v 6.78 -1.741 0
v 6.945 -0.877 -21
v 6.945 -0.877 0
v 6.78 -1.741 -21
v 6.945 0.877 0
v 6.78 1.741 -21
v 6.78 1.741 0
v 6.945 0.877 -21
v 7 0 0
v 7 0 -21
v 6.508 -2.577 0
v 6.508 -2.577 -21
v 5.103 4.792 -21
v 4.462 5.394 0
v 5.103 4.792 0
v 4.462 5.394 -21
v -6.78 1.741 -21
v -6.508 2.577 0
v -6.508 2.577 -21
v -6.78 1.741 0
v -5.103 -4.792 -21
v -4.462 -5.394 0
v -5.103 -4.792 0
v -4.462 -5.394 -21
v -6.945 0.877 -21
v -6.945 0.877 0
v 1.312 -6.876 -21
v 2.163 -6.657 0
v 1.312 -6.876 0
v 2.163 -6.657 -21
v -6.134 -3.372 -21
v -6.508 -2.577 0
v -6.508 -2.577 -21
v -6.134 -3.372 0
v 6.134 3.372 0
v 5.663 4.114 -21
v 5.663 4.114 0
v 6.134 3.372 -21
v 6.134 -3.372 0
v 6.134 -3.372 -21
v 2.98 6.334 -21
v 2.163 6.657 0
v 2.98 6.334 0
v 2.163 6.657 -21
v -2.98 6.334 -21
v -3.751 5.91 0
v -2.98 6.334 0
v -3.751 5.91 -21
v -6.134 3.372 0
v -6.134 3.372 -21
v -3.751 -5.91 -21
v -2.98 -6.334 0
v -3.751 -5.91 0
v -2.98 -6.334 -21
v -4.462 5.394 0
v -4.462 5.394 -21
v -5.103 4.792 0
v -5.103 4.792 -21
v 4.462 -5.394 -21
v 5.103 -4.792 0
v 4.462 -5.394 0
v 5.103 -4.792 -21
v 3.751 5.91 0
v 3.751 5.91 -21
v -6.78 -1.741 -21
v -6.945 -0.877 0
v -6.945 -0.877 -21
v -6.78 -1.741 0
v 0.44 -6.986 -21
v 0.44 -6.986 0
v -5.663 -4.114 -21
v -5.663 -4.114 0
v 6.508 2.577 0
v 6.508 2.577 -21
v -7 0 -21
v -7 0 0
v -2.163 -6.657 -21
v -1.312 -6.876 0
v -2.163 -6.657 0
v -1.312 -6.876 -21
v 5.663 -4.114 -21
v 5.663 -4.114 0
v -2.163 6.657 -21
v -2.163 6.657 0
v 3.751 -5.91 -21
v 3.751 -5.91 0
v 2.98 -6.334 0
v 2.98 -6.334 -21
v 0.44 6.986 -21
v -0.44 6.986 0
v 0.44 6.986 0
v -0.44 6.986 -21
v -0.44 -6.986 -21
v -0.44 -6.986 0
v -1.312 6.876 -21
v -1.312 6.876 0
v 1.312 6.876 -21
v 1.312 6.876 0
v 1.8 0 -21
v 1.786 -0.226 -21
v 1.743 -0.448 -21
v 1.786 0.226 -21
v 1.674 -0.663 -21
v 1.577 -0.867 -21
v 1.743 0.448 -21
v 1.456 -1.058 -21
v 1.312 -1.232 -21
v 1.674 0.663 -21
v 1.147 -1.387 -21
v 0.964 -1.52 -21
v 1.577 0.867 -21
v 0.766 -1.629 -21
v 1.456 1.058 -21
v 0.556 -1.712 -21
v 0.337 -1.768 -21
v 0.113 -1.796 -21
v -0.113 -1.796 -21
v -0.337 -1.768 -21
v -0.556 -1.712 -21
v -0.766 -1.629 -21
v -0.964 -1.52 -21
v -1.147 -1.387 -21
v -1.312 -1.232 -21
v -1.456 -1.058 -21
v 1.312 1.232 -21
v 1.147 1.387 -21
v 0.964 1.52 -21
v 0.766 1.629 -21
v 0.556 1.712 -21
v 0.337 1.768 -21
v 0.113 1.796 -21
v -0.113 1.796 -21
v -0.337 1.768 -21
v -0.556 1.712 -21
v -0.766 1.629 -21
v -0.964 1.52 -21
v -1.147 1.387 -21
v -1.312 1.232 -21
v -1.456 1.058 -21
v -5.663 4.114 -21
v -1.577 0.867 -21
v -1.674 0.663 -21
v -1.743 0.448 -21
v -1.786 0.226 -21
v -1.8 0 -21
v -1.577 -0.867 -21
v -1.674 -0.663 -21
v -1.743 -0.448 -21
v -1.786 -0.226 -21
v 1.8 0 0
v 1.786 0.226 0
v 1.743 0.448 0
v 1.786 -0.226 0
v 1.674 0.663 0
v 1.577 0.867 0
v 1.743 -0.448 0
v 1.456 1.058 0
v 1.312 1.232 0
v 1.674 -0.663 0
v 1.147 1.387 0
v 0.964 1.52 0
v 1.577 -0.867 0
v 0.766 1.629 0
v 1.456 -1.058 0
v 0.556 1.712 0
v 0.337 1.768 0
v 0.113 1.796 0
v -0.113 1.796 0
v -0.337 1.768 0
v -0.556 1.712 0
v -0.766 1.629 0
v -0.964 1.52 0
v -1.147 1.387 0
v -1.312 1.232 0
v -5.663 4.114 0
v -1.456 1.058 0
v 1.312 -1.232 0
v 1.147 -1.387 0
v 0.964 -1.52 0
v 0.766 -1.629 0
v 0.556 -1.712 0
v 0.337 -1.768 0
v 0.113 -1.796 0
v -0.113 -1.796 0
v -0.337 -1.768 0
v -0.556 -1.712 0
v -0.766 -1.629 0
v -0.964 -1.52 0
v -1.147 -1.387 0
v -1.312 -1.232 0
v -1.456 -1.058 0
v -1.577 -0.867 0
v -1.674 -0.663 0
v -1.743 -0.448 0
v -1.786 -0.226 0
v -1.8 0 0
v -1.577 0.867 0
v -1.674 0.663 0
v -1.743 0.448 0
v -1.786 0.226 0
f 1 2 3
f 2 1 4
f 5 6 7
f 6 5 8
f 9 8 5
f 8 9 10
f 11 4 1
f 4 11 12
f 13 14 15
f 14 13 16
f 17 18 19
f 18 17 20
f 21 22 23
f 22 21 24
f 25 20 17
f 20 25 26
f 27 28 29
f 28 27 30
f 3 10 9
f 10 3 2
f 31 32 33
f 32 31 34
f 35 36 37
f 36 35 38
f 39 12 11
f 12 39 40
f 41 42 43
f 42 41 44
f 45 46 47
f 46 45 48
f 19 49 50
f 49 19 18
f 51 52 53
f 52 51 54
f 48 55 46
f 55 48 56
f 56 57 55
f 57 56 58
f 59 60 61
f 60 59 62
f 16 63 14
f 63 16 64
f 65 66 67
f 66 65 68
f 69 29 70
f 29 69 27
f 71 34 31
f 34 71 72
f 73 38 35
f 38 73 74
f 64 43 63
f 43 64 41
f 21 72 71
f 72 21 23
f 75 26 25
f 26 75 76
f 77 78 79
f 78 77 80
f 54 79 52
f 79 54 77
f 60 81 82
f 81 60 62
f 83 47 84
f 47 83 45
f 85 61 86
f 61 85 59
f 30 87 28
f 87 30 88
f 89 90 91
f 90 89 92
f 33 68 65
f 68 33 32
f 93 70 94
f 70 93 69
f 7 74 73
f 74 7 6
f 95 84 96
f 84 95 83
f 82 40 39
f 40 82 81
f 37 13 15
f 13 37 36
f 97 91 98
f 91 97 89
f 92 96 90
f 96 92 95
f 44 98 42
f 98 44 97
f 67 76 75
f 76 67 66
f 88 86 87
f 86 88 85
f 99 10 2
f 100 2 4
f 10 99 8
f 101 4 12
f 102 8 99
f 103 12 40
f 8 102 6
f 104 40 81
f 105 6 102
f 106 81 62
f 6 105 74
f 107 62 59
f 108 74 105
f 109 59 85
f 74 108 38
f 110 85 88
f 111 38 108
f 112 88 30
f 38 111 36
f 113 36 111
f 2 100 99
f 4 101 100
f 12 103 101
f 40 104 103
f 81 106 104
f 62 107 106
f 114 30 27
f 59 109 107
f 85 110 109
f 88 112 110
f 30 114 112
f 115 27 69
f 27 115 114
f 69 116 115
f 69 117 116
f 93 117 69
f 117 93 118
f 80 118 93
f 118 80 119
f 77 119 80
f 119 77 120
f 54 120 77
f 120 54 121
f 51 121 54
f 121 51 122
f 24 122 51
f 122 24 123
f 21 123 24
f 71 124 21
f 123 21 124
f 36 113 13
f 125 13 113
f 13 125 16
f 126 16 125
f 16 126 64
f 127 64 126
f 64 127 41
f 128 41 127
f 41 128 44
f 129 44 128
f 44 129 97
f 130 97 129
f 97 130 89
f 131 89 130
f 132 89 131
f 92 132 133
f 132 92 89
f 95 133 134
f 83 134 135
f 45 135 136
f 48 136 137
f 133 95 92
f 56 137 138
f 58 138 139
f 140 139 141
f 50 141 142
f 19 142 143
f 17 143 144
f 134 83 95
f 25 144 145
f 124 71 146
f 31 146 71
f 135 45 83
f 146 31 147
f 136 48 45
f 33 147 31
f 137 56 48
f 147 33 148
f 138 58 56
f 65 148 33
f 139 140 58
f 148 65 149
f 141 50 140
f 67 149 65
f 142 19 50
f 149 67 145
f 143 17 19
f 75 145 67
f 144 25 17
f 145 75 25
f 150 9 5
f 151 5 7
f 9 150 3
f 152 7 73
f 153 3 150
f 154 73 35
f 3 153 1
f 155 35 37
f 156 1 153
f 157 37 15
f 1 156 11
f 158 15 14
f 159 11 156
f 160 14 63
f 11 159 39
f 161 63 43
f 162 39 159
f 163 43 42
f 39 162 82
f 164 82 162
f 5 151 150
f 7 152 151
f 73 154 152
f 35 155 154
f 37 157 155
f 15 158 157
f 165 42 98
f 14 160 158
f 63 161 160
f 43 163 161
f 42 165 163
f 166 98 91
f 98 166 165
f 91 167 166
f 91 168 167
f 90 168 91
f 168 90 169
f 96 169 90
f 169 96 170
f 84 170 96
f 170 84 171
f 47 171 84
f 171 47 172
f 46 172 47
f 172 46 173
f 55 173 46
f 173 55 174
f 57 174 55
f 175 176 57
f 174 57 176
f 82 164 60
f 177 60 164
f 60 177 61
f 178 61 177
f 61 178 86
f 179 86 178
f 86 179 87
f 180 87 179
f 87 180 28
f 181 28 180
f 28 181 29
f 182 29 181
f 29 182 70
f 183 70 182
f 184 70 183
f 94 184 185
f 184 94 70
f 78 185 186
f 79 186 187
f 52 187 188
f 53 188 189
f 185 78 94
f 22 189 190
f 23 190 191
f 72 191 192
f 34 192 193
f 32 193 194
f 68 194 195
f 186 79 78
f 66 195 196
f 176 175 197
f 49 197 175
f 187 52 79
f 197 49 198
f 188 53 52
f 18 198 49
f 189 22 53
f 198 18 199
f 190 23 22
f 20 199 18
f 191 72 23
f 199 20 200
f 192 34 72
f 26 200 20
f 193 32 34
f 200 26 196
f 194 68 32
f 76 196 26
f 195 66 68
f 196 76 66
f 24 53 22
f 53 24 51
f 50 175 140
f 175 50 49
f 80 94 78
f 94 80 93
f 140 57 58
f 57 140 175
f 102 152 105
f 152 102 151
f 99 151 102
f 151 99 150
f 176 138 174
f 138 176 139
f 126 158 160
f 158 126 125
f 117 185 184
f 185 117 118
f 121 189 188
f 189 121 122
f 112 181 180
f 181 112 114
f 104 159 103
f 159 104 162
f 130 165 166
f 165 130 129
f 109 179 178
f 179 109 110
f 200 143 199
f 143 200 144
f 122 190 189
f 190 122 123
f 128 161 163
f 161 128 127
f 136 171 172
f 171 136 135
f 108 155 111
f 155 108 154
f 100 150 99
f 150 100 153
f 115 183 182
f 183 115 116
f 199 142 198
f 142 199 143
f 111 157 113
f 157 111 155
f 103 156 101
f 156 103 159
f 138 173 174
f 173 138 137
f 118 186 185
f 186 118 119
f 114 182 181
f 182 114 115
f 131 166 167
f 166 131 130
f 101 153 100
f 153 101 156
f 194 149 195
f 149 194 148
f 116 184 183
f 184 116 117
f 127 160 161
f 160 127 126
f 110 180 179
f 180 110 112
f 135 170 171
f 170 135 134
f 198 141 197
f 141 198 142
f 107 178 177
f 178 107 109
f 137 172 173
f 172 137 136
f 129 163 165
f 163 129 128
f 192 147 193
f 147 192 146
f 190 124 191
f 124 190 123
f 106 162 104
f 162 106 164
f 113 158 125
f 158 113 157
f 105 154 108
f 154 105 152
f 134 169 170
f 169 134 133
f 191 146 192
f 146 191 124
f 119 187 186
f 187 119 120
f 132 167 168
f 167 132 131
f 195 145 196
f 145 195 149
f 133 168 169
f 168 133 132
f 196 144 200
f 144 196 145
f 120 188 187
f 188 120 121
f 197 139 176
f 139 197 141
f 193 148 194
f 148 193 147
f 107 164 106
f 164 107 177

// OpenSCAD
$fn = 50;


difference() {
	union() {
		translate(v = [0, 0, -21.0000000000]) {
			cylinder(h = 21, r = 7.0000000000);
		}
	}
	union() {
		#translate(v = [0, 0, -21]) {
			cylinder(h = 21, r = 1.8000000000);
		}
	}
}
